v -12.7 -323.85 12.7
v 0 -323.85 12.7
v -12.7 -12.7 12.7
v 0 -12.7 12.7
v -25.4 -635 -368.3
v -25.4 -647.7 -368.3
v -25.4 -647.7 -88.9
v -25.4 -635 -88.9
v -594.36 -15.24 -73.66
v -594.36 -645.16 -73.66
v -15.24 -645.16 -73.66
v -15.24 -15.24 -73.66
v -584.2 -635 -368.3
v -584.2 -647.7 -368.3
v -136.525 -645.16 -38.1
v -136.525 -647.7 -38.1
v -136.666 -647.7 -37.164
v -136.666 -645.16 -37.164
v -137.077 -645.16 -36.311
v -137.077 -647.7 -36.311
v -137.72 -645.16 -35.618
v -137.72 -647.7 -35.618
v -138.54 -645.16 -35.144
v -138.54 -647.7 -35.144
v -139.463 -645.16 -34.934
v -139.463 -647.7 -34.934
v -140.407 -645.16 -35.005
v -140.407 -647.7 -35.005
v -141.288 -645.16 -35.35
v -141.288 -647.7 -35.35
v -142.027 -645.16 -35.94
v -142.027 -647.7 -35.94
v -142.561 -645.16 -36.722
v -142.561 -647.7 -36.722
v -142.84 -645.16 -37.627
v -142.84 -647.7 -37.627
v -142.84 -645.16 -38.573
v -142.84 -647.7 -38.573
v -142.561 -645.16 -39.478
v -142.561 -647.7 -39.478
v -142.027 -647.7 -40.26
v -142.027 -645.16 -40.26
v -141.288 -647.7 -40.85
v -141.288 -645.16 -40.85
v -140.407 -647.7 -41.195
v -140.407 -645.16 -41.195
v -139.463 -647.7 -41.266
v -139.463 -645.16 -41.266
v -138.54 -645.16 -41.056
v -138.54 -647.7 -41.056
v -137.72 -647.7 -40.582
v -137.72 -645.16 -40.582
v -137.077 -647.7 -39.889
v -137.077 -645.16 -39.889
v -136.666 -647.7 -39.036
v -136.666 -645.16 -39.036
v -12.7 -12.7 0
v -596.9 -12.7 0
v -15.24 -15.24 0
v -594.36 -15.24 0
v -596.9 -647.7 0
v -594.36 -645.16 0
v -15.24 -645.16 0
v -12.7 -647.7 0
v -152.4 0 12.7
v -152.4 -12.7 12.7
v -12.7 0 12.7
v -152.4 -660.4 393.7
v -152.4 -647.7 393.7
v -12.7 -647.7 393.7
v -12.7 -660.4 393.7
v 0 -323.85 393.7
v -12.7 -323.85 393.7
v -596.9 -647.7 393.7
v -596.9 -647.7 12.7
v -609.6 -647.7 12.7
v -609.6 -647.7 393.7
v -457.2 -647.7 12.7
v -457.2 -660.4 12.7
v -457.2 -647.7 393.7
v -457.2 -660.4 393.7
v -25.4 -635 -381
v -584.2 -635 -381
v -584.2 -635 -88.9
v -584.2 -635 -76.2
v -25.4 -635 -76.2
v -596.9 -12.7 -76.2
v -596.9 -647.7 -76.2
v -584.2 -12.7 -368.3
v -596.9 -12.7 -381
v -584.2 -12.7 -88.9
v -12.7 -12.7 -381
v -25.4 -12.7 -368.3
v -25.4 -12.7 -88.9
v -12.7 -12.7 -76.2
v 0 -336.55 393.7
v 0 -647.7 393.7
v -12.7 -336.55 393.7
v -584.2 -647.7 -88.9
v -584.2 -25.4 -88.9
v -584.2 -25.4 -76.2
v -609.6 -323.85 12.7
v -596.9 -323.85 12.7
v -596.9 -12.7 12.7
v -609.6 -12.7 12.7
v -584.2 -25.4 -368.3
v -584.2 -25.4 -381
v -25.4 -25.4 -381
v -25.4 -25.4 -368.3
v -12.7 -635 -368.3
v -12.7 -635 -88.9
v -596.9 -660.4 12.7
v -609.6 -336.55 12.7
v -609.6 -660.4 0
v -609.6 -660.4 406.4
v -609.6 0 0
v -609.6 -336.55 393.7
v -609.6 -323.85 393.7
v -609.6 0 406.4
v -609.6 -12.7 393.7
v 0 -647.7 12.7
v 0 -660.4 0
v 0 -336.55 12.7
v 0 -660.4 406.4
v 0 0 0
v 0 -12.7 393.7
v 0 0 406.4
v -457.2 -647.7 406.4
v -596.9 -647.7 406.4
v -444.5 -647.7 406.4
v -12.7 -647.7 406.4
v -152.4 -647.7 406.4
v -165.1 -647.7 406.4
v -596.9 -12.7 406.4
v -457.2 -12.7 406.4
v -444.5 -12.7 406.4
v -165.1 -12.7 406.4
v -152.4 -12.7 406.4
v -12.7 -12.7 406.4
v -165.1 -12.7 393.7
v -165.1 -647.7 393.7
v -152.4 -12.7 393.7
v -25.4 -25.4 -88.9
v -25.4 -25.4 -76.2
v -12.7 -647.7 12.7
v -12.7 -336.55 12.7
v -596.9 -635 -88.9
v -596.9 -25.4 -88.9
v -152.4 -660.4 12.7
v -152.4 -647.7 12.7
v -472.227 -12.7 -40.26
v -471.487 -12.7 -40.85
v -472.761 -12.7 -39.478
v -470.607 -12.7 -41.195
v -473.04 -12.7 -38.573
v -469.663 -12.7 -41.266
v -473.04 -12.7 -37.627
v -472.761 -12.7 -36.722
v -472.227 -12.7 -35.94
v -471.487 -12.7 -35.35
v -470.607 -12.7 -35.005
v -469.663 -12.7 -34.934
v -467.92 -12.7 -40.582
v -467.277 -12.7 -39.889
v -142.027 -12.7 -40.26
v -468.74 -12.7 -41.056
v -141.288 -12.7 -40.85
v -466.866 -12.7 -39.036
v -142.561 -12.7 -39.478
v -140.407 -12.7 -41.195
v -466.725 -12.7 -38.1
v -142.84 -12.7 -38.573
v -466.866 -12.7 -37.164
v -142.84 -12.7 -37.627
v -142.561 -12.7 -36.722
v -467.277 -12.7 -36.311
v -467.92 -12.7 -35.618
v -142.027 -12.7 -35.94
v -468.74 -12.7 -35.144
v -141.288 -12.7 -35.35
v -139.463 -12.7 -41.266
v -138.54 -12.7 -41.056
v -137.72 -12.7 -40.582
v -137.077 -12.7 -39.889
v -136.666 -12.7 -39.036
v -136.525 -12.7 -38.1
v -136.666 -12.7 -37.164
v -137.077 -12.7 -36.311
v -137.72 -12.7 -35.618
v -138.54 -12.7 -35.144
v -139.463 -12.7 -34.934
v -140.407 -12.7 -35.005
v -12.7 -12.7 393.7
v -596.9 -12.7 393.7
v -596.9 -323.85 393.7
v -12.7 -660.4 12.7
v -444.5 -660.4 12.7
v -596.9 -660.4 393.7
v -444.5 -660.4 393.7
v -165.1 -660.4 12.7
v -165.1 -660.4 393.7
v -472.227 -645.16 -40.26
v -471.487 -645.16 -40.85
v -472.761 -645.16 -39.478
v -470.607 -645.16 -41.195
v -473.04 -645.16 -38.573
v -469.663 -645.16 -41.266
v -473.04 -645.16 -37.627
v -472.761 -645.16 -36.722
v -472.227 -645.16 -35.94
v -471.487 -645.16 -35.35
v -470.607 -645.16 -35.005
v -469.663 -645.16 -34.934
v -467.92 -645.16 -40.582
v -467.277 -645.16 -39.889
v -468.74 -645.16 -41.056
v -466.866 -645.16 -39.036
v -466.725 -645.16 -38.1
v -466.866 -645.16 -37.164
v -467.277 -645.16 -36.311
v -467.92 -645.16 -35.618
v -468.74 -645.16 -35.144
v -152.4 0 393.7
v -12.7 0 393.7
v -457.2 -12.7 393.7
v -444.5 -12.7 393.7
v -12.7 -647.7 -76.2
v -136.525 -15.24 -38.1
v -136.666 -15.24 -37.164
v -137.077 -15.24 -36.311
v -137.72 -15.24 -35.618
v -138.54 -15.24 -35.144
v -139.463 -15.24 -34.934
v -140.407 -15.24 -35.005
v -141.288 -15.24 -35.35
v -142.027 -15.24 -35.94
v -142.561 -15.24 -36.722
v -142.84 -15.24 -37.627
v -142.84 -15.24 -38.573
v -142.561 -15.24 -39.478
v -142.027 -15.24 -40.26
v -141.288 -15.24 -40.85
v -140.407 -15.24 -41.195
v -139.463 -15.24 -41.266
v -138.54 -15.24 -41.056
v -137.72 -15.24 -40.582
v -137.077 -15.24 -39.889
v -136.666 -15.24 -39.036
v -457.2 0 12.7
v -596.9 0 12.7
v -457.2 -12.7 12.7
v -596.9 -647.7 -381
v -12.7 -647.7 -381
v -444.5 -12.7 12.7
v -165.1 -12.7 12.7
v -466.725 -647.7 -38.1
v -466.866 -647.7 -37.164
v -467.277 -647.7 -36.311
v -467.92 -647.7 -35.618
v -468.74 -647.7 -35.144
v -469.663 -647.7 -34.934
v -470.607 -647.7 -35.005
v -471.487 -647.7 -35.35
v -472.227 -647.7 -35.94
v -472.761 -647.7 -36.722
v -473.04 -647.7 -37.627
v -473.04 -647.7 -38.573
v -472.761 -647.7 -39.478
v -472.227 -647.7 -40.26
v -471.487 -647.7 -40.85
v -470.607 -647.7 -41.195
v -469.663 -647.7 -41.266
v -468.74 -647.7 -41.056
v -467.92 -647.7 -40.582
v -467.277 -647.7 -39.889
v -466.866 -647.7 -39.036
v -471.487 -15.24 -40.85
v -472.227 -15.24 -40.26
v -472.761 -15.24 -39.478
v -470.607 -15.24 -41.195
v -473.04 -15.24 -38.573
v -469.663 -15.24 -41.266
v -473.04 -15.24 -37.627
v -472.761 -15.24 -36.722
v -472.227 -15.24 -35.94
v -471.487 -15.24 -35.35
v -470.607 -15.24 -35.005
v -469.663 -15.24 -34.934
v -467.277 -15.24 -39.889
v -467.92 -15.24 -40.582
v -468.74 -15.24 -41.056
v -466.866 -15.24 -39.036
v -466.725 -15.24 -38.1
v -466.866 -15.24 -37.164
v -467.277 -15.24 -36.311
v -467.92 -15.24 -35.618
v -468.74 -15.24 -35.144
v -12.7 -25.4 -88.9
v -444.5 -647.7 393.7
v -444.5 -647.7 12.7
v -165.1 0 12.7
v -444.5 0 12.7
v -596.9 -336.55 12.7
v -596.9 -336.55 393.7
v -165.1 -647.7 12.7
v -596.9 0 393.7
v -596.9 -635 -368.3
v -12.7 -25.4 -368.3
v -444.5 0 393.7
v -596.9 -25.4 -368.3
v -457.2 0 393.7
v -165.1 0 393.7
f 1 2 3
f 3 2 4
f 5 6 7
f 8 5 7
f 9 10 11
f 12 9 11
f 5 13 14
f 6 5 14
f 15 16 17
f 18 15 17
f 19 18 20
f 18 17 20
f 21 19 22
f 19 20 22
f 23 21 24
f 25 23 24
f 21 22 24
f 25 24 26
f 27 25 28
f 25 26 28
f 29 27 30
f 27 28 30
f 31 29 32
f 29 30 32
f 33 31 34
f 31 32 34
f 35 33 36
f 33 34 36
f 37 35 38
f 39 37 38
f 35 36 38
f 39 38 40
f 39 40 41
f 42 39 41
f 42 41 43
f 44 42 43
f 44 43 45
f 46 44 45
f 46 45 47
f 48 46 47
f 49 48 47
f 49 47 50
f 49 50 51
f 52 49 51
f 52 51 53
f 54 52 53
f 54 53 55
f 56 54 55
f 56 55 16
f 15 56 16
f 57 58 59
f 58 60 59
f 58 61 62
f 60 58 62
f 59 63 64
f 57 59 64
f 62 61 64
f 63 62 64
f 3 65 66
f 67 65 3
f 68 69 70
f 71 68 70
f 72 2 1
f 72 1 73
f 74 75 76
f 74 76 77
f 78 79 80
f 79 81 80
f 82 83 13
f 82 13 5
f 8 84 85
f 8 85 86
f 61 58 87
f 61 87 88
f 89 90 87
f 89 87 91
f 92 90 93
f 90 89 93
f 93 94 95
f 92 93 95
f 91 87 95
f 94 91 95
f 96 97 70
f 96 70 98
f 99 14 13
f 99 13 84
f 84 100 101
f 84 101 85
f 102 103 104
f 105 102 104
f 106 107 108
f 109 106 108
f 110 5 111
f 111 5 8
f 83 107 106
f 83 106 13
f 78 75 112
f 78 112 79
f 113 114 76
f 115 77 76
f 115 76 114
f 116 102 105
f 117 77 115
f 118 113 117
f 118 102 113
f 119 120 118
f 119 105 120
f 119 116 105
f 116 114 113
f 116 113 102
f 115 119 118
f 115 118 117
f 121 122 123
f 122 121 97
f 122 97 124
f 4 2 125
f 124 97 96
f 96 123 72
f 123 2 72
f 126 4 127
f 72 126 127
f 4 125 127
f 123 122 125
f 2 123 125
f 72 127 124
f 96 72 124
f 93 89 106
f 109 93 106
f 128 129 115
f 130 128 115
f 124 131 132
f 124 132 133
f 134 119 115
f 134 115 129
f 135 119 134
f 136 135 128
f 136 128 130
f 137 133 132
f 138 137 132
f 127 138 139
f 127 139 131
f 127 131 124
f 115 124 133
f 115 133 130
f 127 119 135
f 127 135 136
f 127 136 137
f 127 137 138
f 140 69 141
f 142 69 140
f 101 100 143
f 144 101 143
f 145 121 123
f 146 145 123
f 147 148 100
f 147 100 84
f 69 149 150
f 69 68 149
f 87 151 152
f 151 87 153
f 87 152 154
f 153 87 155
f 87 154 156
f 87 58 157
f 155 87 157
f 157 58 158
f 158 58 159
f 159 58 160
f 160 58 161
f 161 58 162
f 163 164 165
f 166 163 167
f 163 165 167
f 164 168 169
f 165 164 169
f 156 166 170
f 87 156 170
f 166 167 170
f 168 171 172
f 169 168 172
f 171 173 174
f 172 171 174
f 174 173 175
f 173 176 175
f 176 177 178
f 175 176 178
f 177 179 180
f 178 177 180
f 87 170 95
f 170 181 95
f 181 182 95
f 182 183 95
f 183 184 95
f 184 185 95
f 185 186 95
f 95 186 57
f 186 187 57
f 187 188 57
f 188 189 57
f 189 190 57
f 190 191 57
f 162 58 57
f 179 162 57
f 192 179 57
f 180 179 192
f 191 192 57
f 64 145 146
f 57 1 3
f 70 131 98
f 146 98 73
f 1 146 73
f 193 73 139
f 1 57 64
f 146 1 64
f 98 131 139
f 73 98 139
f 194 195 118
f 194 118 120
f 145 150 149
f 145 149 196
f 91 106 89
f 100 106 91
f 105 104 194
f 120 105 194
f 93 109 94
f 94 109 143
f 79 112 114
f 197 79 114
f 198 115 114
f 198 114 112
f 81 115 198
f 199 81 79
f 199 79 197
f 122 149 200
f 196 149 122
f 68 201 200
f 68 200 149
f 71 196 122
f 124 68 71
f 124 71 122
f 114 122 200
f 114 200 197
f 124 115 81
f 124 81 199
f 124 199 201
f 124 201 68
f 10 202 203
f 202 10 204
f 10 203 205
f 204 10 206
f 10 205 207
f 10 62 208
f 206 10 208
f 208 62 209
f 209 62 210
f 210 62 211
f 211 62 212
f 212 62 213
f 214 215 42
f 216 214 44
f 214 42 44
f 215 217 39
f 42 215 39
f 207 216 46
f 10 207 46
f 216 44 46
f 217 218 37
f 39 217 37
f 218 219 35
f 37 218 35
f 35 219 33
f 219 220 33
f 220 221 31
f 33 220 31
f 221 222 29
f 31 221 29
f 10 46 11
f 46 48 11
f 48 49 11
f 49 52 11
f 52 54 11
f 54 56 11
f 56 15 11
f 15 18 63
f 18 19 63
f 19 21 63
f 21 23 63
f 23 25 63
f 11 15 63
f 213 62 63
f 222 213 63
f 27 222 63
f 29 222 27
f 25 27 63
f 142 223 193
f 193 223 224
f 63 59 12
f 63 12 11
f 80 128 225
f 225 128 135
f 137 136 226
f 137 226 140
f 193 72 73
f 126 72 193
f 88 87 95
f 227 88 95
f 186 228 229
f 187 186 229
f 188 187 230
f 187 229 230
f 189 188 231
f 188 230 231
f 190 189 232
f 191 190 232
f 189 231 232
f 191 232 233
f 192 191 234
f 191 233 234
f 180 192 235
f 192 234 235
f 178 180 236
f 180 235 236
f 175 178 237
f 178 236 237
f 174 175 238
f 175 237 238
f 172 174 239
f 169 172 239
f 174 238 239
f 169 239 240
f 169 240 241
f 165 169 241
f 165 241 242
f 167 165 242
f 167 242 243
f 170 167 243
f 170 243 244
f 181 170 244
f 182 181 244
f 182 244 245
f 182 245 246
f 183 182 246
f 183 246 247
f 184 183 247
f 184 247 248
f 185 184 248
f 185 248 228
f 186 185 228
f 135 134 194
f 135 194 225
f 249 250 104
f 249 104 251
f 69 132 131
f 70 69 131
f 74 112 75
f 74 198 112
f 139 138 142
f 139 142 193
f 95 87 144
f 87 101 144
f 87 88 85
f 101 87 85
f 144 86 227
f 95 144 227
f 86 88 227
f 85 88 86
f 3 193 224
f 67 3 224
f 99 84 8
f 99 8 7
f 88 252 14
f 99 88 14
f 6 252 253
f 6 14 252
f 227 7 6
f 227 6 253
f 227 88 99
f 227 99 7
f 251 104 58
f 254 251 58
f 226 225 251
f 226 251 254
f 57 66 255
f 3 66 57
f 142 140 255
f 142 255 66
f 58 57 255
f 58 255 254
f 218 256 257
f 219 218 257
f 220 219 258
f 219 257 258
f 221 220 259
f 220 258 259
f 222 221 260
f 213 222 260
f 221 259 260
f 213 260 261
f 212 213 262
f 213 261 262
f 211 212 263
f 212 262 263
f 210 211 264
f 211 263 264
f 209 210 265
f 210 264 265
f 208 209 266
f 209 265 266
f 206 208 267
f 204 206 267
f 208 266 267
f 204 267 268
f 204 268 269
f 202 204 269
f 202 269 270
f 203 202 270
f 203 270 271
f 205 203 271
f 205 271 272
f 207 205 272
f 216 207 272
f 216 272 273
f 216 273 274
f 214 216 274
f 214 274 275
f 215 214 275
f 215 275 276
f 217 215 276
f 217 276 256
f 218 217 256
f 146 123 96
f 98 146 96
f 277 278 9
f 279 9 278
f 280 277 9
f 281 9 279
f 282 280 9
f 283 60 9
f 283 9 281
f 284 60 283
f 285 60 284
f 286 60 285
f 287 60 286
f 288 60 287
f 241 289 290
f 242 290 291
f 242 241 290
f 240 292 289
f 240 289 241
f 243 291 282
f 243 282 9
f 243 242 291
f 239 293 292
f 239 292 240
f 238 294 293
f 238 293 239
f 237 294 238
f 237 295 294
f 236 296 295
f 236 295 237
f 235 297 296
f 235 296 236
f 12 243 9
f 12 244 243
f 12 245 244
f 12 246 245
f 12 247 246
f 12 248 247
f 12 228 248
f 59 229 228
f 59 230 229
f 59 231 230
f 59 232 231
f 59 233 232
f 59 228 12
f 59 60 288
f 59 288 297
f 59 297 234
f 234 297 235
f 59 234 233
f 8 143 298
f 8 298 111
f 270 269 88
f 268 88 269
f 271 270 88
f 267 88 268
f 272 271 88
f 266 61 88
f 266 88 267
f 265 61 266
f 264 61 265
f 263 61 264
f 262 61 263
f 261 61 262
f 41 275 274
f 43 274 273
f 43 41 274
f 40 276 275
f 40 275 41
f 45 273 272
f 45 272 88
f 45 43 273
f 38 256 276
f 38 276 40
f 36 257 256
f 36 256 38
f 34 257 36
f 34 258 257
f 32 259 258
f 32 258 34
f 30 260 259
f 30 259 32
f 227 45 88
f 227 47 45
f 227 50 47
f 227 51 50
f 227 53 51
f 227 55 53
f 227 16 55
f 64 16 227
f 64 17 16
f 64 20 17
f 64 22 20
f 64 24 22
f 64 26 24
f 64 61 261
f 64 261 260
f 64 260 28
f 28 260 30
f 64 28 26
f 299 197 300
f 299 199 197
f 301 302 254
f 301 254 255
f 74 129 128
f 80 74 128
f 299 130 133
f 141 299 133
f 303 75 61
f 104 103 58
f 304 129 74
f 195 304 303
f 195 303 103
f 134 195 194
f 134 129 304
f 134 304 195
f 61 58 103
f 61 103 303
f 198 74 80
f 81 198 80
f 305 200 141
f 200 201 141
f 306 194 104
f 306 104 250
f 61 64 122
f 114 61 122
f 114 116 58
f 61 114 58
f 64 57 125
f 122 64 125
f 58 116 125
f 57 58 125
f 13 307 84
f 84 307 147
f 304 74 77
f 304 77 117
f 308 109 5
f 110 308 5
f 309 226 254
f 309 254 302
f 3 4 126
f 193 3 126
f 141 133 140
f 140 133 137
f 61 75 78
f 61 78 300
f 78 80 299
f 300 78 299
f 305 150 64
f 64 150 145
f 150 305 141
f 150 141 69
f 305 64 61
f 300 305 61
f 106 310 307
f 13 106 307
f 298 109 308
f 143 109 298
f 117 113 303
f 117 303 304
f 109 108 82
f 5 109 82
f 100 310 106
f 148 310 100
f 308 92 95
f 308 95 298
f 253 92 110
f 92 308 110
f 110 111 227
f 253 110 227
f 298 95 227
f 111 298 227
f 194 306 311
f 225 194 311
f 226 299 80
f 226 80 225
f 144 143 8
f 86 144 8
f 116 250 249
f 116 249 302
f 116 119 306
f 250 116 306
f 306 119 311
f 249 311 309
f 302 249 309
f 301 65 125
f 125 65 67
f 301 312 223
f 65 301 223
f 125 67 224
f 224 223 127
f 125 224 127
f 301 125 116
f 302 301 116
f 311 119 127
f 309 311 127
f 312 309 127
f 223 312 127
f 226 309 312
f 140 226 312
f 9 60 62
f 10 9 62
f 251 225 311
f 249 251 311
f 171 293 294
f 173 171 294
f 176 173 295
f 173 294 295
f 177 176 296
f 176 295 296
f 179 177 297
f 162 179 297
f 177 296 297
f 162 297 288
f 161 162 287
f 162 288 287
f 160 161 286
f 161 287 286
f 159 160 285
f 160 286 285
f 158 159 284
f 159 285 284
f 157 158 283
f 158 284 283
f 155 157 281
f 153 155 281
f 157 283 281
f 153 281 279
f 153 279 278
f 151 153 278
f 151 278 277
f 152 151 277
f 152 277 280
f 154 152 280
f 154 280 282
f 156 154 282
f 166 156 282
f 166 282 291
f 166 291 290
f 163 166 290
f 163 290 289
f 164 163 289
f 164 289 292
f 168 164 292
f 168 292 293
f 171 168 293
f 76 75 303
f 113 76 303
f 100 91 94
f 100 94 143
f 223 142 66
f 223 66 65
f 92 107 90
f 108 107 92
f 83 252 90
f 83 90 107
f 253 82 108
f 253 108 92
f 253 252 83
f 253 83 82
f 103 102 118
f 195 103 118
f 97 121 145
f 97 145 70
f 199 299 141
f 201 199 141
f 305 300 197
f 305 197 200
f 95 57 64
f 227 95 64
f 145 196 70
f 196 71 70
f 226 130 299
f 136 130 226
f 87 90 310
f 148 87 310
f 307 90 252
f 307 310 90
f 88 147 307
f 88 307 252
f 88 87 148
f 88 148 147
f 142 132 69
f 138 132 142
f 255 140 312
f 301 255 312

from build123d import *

# Parameters (mm, degrees)
F0_W      = 609.6
F0_H      = 406.4
F0_W_2    = 139.7
F0_H_2    = 381
F0_W_3    = 279.4
F1_DEPTH  = 660.4
F2_W      = 139.7
F2_H      = 152.4
F2_W_2    = 279.4
F2_H_2    = 304.8
F3_DEPTH  = 406.401
F4_W      = 152.4
F4_H      = 381
F4_W_2    = 304.8
F5_DEPTH  = 609.601
F6_W      = 12.7
F6_H      = 381
F7_DEPTH  = 304.8
F8_W      = 139.7
F8_H      = 12.7
F8_W_2    = 279.4
F9_DEPTH  = 406.401
F10_W     = 12.7
F10_H     = 635
F11_DEPTH = 25.4
F12_W     = 584.2
F12_H     = 635
F13_DEPTH = 76.2
F14_T     = -2.54
F15_R     = 3.175
F16_DEPTH = 647.701
F17_W     = 584.2
F17_H     = 635
F18_DEPTH = 304.8
F19_W     = 558.8
F19_H     = 279.4
F20_DEPTH = 647.701
F21_W     = 609.6
F21_H     = 279.4
F22_DEPTH = 596.901
F23_W     = 558.8
F23_H     = 609.6
F24_DEPTH = 787.401
F25_W     = 12.7
F25_H     = 381
F26_DEPTH = 609.601
F27_W     = 12.7
F27_H     = 381
F28_DEPTH = 12.7
F29_W     = 12.7
F29_H     = 381
F30_DEPTH = 12.7


with BuildPart() as f1:
    # F0 (on Front) → F1 (new body)
    with BuildSketch(Plane.XZ):
        with Locations((-304.8, 203.2)):
            Rectangle(F0_W, F0_H)
        with Locations((-527.05, 203.2)):
            Rectangle(F0_W_2, F0_H_2, mode=Mode.SUBTRACT)
        with Locations((-304.8, 203.2)):
            Rectangle(F0_W_3, F0_H_2, mode=Mode.SUBTRACT)
        with Locations((-82.55, 203.2)):
            Rectangle(F0_W_2, F0_H_2, mode=Mode.SUBTRACT)
    extrude(amount=F1_DEPTH)

    # F2 (on face) → F3 (cut, through all)
    with BuildSketch(Plane.XY.offset(406.4)):
        with Locations((-527.05, -88.9)):
            Rectangle(F2_W, F2_H)
        with Locations((-304.8, -88.9)):
            Rectangle(F2_W_2, F2_H)
        with Locations((-82.55, -88.9)):
            Rectangle(F2_W, F2_H)
        with Locations((-82.55, -330.2)):
            Rectangle(F2_W, F2_H_2)
        with Locations((-304.8, -330.2)):
            Rectangle(F2_W_2, F2_H_2)
        with Locations((-527.05, -330.2)):
            Rectangle(F2_W, F2_H_2)
        with Locations((-527.05, -571.5)):
            Rectangle(F2_W, F2_H)
        with Locations((-304.8, -571.5)):
            Rectangle(F2_W_2, F2_H)
        with Locations((-82.55, -571.5)):
            Rectangle(F2_W, F2_H)
    extrude(amount=-F3_DEPTH, mode=Mode.SUBTRACT)

    # F4 (on face) → F5 (cut, through all)
    with BuildSketch(Plane.YZ):
        with Locations((-571.5, 203.2)):
            Rectangle(F4_W, F4_H)
        with Locations((-330.2, 203.2)):
            Rectangle(F4_W_2, F4_H)
        with Locations((-88.9, 203.2)):
            Rectangle(F4_W, F4_H)
    extrude(amount=-F5_DEPTH, mode=Mode.SUBTRACT)

    # F6 (on face) → F7 (cut)
    with BuildSketch(Plane.YZ.offset(-152.4)):
        with Locations((-488.95, 203.2)):
            Rectangle(F6_W, F6_H)
        with Locations((-171.45, 203.2)):
            Rectangle(F6_W, F6_H)
    extrude(amount=-F7_DEPTH, mode=Mode.SUBTRACT)

    # F8 (on face) → F9 (cut, through all)
    with BuildSketch(Plane.XY.offset(406.4)):
        with Locations((-527.05, -171.45)):
            Rectangle(F8_W, F8_H)
        with Locations((-304.8, -171.45)):
            Rectangle(F8_W_2, F8_H)
        with Locations((-82.55, -171.45)):
            Rectangle(F8_W, F8_H)
        with Locations((-82.55, -488.95)):
            Rectangle(F8_W, F8_H)
        with Locations((-304.8, -488.95)):
            Rectangle(F8_W_2, F8_H)
        with Locations((-527.05, -488.95)):
            Rectangle(F8_W, F8_H)
    extrude(amount=-F9_DEPTH, mode=Mode.SUBTRACT)

    # F10 (on face) → F11 (cut)
    with BuildSketch(Plane(origin=(0, 0, 0), x_dir=(1, 0, 0), z_dir=(0, 0, -1))):
        with Locations((-450.85, 330.2)):
            Rectangle(F10_W, F10_H)
        with Locations((-158.75, 330.2)):
            Rectangle(F10_W, F10_H)
    extrude(amount=-F11_DEPTH, mode=Mode.SUBTRACT)

    # F25 (on face) → F26 (cut, through all)
    with BuildSketch(Plane.YZ):
        with Locations((-488.95, 203.2)):
            Rectangle(F25_W, F25_H)
        with Locations((-171.45, 203.2)):
            Rectangle(F25_W, F25_H)
    extrude(amount=-F26_DEPTH, mode=Mode.SUBTRACT)

    # F27 (on face) → F28 (join)
    with BuildSketch(Plane.YZ):
        with Locations((-330.2, 203.2)):
            Rectangle(F27_W, F27_H)
    extrude(amount=-F28_DEPTH)

    # F29 (on face) → F30 (join)
    with BuildSketch(Plane(origin=(-609.6, 0, 0), x_dir=(0, -1, 0), z_dir=(-1, 0, 0))):
        with Locations((330.2, 203.2)):
            Rectangle(F29_W, F29_H)
    extrude(amount=-F30_DEPTH)


with BuildPart() as f13:
    # F12 (on face) → F13 (new body)
    with BuildSketch(Plane(origin=(0, 0, 0), x_dir=(1, 0, 0), z_dir=(0, 0, -1))):
        with Locations((-304.8, 330.2)):
            Rectangle(F12_W, F12_H)
    extrude(amount=F13_DEPTH)

    # F14
    f14_openings = [f13.faces().sort_by_distance(p)[0] for p in [
        (-304.8, -330.2, 0),
    ]]
    offset(amount=F14_T, openings=f14_openings)

    # F15 (on face) → F16 (cut, through all)
    with BuildSketch(Plane.XZ.offset(647.7)):
        with Locations((-139.7, -38.1)):
            Circle(F15_R)
        with Locations((-469.9, -38.1)):
            Circle(F15_R)
    extrude(amount=-F16_DEPTH, mode=Mode.SUBTRACT)


with BuildPart() as f18:
    # F17 (on face) → F18 (new body)
    with BuildSketch(Plane(origin=(0, 0, -76.2), x_dir=(1, 0, 0), z_dir=(0, 0, -1))):
        with Locations((-304.8, 330.2)):
            Rectangle(F17_W, F17_H)
    extrude(amount=F18_DEPTH)

    # F19 (on face) → F20 (cut, through all)
    with BuildSketch(Plane.XZ.offset(647.7)):
        with Locations((-304.8, -228.6)):
            Rectangle(F19_W, F19_H)
    extrude(amount=-F20_DEPTH, mode=Mode.SUBTRACT)

    # F21 (on face) → F22 (cut, through all)
    with BuildSketch(Plane(origin=(-596.9, 0, 0), x_dir=(0, -1, 0), z_dir=(-1, 0, 0))):
        with Locations((330.2, -228.6)):
            Rectangle(F21_W, F21_H)
    extrude(amount=-F22_DEPTH, mode=Mode.SUBTRACT)

    # F23 (on face) → F24 (cut, through all)
    with BuildSketch(Plane(origin=(0, 0, -381), x_dir=(1, 0, 0), z_dir=(0, 0, -1))):
        with Locations((-304.8, 330.2)):
            Rectangle(F23_W, F23_H)
    extrude(amount=-F24_DEPTH, mode=Mode.SUBTRACT)


solid = Compound([f1.part, f13.part, f18.part])
